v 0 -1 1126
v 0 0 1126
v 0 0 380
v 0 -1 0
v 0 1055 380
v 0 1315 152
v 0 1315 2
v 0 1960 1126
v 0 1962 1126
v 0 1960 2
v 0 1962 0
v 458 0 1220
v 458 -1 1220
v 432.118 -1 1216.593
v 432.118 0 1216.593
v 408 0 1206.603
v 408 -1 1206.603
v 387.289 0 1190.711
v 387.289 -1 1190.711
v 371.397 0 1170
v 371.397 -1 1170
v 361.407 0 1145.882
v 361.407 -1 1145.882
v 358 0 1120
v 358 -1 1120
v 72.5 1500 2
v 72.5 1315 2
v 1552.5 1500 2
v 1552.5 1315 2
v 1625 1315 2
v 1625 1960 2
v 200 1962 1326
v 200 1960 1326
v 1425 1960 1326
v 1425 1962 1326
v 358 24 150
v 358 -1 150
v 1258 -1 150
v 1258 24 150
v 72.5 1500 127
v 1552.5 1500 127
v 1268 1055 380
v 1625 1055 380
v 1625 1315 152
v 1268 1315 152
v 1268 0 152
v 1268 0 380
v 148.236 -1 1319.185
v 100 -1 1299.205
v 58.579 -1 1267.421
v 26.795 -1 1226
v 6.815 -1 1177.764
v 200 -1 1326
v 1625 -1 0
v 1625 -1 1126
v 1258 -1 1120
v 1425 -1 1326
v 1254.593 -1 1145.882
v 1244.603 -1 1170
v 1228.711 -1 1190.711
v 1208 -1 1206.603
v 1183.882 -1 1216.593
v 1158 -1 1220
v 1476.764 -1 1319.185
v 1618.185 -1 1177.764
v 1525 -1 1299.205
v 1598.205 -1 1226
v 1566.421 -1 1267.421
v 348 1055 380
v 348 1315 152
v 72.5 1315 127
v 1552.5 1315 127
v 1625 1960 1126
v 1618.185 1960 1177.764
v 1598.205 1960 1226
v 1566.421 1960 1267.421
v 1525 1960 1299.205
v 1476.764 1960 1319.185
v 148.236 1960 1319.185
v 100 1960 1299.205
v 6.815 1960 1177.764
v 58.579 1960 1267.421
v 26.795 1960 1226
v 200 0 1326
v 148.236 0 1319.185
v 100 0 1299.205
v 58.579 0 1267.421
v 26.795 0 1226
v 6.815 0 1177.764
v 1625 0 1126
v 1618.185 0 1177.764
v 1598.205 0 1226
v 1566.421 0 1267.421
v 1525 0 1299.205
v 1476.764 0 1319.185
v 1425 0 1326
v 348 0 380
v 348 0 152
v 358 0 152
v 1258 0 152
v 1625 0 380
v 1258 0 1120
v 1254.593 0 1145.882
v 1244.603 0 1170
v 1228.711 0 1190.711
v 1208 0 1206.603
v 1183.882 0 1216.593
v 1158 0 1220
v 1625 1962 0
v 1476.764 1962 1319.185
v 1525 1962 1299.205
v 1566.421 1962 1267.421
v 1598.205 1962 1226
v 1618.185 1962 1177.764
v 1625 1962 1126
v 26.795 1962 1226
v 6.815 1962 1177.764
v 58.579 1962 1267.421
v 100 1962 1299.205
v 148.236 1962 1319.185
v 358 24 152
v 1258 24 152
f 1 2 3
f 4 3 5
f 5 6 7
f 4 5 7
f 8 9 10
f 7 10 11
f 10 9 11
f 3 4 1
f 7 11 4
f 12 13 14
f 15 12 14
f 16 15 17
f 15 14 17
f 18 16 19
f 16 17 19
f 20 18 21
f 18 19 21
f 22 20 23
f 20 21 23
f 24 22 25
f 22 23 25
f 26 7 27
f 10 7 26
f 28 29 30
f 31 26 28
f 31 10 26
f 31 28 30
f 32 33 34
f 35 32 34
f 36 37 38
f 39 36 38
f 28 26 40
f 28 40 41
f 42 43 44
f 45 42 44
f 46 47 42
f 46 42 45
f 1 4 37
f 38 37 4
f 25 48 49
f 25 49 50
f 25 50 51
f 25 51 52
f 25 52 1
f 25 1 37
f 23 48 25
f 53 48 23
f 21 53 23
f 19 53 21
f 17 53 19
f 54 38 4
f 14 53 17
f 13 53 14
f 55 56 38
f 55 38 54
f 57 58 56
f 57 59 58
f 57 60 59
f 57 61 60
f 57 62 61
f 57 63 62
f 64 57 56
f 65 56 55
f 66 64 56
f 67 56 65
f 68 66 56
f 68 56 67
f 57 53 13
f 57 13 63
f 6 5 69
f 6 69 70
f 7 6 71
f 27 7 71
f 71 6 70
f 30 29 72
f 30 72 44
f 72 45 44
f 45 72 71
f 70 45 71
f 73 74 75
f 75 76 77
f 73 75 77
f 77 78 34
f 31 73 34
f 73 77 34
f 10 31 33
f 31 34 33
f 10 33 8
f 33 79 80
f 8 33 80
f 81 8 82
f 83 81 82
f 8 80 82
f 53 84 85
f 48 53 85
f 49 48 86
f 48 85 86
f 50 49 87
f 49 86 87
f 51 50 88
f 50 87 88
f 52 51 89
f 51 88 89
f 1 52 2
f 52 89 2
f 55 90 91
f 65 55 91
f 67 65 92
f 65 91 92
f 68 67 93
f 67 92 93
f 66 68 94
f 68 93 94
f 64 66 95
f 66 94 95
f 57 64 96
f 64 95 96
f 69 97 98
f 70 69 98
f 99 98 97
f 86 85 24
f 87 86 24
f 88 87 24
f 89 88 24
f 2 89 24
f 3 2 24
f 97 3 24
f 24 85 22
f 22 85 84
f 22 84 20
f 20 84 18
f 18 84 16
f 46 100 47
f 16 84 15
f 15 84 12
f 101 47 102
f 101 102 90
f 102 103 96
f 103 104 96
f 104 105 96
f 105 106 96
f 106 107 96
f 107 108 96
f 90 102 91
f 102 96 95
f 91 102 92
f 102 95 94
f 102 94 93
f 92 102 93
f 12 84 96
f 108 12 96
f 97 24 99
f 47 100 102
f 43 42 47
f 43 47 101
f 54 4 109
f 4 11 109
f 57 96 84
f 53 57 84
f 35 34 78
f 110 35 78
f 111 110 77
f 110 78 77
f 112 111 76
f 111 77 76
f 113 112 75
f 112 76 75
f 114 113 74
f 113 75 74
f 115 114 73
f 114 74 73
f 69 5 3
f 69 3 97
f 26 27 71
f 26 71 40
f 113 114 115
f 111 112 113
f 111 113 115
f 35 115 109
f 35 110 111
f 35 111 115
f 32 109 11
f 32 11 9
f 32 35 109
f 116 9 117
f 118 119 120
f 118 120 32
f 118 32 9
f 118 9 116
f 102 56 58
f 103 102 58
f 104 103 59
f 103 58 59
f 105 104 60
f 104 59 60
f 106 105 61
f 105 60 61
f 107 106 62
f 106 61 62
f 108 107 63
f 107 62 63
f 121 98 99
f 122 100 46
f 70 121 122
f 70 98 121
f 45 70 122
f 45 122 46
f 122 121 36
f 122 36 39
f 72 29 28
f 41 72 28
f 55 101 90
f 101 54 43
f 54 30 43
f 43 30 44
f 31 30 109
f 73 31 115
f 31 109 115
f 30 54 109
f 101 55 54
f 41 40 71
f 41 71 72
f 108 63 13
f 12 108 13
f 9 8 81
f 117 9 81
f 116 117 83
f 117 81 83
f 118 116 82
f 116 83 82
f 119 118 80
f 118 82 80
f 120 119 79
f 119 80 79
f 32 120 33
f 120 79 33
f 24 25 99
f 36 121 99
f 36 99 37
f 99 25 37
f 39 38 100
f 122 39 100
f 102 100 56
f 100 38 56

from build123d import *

# Parameters (mm, degrees)
F0_W      = 1625
F0_H      = 1960
F1_DEPTH  = 380
F2_W      = 920
F2_H      = 1960
F3_DEPTH  = 228
F4_W      = 1625
F4_H      = 645
F5_DEPTH  = 378
F6_W      = 1480
F6_H      = 185
F7_DEPTH  = 125
F9_DEPTH  = 2
F11_DEPTH = 1
F13_DEPTH = 25
F15_DEPTH = 1625.001


with BuildPart() as f1:
    # F0 (on Top) → F1 (new body)
    with BuildSketch(Plane.XY):
        with Locations((812.5, 980)):
            Rectangle(F0_W, F0_H)
    extrude(amount=F1_DEPTH)

    # F2 (on face) → F3 (cut)
    with BuildSketch(Plane.XY.offset(380)):
        with Locations((808, 980)):
            Rectangle(F2_W, F2_H)
    extrude(amount=-F3_DEPTH, mode=Mode.SUBTRACT)

    # F4 (on face) → F5 (cut)
    with BuildSketch(Plane.XY.offset(380)):
        with Locations((812.5, 1637.5)):
            Rectangle(F4_W, F4_H)
    extrude(amount=-F5_DEPTH, mode=Mode.SUBTRACT)

    # F6 (on face) → F7 (join)
    with BuildSketch(Plane.XY.offset(2)):
        with Locations((812.5, 1407.5)):
            Rectangle(F6_W, F6_H)
    extrude(amount=F7_DEPTH)

    # F8 (on face) → F9 (join)
    with BuildSketch(Plane(origin=(0, 1960, 0), x_dir=(-1, 0, 0), z_dir=(0, 1, 0))):
        with BuildLine():
            Line((-1625, 1126), (-1625, 0))
            Line((-1625, 0), (0, 0))
            Line((0, 0), (0, 1126))
            ThreePointArc((0, 1126), (-58.578644, 1267.421356), (-200, 1326))
            Line((-200, 1326), (-1425, 1326))
            ThreePointArc((-1425, 1326), (-1566.421356, 1267.421356), (-1625, 1126))
        make_face()
    extrude(amount=F9_DEPTH)

    # F10 (on face) → F11 (join)
    with BuildSketch(Plane.XZ):
        with BuildLine():
            Line((0, 1126), (0, 0))
            Line((0, 0), (1625, 0))
            Line((1625, 0), (1625, 1126))
            ThreePointArc((1625, 1126), (1566.421356, 1267.421356), (1425, 1326))
            Line((1425, 1326), (200, 1326))
            ThreePointArc((200, 1326), (58.578644, 1267.421356), (0, 1126))
        make_face()
    extrude(amount=F11_DEPTH)

    # F12 (on face) → F13 (cut)
    with BuildSketch(Plane.XZ.offset(1)):
        with BuildLine():
            Line((358, 1120), (358, 150))
            Line((358, 150), (1258, 150))
            Line((1258, 150), (1258, 1120))
            ThreePointArc((1258, 1120), (1228.710678, 1190.710678), (1158, 1220))
            Line((1158, 1220), (458, 1220))
            ThreePointArc((458, 1220), (387.289322, 1190.710678), (358, 1120))
        make_face()
    extrude(amount=-F13_DEPTH, mode=Mode.SUBTRACT)

    # F14 (on face) → F15 (cut, through all)
    with BuildSketch(Plane.YZ.offset(1625)):
        Polygon((1315, 380), (1055, 380), (1315, 152), align=None)
    extrude(amount=-F15_DEPTH, mode=Mode.SUBTRACT)


solid = f1.part
